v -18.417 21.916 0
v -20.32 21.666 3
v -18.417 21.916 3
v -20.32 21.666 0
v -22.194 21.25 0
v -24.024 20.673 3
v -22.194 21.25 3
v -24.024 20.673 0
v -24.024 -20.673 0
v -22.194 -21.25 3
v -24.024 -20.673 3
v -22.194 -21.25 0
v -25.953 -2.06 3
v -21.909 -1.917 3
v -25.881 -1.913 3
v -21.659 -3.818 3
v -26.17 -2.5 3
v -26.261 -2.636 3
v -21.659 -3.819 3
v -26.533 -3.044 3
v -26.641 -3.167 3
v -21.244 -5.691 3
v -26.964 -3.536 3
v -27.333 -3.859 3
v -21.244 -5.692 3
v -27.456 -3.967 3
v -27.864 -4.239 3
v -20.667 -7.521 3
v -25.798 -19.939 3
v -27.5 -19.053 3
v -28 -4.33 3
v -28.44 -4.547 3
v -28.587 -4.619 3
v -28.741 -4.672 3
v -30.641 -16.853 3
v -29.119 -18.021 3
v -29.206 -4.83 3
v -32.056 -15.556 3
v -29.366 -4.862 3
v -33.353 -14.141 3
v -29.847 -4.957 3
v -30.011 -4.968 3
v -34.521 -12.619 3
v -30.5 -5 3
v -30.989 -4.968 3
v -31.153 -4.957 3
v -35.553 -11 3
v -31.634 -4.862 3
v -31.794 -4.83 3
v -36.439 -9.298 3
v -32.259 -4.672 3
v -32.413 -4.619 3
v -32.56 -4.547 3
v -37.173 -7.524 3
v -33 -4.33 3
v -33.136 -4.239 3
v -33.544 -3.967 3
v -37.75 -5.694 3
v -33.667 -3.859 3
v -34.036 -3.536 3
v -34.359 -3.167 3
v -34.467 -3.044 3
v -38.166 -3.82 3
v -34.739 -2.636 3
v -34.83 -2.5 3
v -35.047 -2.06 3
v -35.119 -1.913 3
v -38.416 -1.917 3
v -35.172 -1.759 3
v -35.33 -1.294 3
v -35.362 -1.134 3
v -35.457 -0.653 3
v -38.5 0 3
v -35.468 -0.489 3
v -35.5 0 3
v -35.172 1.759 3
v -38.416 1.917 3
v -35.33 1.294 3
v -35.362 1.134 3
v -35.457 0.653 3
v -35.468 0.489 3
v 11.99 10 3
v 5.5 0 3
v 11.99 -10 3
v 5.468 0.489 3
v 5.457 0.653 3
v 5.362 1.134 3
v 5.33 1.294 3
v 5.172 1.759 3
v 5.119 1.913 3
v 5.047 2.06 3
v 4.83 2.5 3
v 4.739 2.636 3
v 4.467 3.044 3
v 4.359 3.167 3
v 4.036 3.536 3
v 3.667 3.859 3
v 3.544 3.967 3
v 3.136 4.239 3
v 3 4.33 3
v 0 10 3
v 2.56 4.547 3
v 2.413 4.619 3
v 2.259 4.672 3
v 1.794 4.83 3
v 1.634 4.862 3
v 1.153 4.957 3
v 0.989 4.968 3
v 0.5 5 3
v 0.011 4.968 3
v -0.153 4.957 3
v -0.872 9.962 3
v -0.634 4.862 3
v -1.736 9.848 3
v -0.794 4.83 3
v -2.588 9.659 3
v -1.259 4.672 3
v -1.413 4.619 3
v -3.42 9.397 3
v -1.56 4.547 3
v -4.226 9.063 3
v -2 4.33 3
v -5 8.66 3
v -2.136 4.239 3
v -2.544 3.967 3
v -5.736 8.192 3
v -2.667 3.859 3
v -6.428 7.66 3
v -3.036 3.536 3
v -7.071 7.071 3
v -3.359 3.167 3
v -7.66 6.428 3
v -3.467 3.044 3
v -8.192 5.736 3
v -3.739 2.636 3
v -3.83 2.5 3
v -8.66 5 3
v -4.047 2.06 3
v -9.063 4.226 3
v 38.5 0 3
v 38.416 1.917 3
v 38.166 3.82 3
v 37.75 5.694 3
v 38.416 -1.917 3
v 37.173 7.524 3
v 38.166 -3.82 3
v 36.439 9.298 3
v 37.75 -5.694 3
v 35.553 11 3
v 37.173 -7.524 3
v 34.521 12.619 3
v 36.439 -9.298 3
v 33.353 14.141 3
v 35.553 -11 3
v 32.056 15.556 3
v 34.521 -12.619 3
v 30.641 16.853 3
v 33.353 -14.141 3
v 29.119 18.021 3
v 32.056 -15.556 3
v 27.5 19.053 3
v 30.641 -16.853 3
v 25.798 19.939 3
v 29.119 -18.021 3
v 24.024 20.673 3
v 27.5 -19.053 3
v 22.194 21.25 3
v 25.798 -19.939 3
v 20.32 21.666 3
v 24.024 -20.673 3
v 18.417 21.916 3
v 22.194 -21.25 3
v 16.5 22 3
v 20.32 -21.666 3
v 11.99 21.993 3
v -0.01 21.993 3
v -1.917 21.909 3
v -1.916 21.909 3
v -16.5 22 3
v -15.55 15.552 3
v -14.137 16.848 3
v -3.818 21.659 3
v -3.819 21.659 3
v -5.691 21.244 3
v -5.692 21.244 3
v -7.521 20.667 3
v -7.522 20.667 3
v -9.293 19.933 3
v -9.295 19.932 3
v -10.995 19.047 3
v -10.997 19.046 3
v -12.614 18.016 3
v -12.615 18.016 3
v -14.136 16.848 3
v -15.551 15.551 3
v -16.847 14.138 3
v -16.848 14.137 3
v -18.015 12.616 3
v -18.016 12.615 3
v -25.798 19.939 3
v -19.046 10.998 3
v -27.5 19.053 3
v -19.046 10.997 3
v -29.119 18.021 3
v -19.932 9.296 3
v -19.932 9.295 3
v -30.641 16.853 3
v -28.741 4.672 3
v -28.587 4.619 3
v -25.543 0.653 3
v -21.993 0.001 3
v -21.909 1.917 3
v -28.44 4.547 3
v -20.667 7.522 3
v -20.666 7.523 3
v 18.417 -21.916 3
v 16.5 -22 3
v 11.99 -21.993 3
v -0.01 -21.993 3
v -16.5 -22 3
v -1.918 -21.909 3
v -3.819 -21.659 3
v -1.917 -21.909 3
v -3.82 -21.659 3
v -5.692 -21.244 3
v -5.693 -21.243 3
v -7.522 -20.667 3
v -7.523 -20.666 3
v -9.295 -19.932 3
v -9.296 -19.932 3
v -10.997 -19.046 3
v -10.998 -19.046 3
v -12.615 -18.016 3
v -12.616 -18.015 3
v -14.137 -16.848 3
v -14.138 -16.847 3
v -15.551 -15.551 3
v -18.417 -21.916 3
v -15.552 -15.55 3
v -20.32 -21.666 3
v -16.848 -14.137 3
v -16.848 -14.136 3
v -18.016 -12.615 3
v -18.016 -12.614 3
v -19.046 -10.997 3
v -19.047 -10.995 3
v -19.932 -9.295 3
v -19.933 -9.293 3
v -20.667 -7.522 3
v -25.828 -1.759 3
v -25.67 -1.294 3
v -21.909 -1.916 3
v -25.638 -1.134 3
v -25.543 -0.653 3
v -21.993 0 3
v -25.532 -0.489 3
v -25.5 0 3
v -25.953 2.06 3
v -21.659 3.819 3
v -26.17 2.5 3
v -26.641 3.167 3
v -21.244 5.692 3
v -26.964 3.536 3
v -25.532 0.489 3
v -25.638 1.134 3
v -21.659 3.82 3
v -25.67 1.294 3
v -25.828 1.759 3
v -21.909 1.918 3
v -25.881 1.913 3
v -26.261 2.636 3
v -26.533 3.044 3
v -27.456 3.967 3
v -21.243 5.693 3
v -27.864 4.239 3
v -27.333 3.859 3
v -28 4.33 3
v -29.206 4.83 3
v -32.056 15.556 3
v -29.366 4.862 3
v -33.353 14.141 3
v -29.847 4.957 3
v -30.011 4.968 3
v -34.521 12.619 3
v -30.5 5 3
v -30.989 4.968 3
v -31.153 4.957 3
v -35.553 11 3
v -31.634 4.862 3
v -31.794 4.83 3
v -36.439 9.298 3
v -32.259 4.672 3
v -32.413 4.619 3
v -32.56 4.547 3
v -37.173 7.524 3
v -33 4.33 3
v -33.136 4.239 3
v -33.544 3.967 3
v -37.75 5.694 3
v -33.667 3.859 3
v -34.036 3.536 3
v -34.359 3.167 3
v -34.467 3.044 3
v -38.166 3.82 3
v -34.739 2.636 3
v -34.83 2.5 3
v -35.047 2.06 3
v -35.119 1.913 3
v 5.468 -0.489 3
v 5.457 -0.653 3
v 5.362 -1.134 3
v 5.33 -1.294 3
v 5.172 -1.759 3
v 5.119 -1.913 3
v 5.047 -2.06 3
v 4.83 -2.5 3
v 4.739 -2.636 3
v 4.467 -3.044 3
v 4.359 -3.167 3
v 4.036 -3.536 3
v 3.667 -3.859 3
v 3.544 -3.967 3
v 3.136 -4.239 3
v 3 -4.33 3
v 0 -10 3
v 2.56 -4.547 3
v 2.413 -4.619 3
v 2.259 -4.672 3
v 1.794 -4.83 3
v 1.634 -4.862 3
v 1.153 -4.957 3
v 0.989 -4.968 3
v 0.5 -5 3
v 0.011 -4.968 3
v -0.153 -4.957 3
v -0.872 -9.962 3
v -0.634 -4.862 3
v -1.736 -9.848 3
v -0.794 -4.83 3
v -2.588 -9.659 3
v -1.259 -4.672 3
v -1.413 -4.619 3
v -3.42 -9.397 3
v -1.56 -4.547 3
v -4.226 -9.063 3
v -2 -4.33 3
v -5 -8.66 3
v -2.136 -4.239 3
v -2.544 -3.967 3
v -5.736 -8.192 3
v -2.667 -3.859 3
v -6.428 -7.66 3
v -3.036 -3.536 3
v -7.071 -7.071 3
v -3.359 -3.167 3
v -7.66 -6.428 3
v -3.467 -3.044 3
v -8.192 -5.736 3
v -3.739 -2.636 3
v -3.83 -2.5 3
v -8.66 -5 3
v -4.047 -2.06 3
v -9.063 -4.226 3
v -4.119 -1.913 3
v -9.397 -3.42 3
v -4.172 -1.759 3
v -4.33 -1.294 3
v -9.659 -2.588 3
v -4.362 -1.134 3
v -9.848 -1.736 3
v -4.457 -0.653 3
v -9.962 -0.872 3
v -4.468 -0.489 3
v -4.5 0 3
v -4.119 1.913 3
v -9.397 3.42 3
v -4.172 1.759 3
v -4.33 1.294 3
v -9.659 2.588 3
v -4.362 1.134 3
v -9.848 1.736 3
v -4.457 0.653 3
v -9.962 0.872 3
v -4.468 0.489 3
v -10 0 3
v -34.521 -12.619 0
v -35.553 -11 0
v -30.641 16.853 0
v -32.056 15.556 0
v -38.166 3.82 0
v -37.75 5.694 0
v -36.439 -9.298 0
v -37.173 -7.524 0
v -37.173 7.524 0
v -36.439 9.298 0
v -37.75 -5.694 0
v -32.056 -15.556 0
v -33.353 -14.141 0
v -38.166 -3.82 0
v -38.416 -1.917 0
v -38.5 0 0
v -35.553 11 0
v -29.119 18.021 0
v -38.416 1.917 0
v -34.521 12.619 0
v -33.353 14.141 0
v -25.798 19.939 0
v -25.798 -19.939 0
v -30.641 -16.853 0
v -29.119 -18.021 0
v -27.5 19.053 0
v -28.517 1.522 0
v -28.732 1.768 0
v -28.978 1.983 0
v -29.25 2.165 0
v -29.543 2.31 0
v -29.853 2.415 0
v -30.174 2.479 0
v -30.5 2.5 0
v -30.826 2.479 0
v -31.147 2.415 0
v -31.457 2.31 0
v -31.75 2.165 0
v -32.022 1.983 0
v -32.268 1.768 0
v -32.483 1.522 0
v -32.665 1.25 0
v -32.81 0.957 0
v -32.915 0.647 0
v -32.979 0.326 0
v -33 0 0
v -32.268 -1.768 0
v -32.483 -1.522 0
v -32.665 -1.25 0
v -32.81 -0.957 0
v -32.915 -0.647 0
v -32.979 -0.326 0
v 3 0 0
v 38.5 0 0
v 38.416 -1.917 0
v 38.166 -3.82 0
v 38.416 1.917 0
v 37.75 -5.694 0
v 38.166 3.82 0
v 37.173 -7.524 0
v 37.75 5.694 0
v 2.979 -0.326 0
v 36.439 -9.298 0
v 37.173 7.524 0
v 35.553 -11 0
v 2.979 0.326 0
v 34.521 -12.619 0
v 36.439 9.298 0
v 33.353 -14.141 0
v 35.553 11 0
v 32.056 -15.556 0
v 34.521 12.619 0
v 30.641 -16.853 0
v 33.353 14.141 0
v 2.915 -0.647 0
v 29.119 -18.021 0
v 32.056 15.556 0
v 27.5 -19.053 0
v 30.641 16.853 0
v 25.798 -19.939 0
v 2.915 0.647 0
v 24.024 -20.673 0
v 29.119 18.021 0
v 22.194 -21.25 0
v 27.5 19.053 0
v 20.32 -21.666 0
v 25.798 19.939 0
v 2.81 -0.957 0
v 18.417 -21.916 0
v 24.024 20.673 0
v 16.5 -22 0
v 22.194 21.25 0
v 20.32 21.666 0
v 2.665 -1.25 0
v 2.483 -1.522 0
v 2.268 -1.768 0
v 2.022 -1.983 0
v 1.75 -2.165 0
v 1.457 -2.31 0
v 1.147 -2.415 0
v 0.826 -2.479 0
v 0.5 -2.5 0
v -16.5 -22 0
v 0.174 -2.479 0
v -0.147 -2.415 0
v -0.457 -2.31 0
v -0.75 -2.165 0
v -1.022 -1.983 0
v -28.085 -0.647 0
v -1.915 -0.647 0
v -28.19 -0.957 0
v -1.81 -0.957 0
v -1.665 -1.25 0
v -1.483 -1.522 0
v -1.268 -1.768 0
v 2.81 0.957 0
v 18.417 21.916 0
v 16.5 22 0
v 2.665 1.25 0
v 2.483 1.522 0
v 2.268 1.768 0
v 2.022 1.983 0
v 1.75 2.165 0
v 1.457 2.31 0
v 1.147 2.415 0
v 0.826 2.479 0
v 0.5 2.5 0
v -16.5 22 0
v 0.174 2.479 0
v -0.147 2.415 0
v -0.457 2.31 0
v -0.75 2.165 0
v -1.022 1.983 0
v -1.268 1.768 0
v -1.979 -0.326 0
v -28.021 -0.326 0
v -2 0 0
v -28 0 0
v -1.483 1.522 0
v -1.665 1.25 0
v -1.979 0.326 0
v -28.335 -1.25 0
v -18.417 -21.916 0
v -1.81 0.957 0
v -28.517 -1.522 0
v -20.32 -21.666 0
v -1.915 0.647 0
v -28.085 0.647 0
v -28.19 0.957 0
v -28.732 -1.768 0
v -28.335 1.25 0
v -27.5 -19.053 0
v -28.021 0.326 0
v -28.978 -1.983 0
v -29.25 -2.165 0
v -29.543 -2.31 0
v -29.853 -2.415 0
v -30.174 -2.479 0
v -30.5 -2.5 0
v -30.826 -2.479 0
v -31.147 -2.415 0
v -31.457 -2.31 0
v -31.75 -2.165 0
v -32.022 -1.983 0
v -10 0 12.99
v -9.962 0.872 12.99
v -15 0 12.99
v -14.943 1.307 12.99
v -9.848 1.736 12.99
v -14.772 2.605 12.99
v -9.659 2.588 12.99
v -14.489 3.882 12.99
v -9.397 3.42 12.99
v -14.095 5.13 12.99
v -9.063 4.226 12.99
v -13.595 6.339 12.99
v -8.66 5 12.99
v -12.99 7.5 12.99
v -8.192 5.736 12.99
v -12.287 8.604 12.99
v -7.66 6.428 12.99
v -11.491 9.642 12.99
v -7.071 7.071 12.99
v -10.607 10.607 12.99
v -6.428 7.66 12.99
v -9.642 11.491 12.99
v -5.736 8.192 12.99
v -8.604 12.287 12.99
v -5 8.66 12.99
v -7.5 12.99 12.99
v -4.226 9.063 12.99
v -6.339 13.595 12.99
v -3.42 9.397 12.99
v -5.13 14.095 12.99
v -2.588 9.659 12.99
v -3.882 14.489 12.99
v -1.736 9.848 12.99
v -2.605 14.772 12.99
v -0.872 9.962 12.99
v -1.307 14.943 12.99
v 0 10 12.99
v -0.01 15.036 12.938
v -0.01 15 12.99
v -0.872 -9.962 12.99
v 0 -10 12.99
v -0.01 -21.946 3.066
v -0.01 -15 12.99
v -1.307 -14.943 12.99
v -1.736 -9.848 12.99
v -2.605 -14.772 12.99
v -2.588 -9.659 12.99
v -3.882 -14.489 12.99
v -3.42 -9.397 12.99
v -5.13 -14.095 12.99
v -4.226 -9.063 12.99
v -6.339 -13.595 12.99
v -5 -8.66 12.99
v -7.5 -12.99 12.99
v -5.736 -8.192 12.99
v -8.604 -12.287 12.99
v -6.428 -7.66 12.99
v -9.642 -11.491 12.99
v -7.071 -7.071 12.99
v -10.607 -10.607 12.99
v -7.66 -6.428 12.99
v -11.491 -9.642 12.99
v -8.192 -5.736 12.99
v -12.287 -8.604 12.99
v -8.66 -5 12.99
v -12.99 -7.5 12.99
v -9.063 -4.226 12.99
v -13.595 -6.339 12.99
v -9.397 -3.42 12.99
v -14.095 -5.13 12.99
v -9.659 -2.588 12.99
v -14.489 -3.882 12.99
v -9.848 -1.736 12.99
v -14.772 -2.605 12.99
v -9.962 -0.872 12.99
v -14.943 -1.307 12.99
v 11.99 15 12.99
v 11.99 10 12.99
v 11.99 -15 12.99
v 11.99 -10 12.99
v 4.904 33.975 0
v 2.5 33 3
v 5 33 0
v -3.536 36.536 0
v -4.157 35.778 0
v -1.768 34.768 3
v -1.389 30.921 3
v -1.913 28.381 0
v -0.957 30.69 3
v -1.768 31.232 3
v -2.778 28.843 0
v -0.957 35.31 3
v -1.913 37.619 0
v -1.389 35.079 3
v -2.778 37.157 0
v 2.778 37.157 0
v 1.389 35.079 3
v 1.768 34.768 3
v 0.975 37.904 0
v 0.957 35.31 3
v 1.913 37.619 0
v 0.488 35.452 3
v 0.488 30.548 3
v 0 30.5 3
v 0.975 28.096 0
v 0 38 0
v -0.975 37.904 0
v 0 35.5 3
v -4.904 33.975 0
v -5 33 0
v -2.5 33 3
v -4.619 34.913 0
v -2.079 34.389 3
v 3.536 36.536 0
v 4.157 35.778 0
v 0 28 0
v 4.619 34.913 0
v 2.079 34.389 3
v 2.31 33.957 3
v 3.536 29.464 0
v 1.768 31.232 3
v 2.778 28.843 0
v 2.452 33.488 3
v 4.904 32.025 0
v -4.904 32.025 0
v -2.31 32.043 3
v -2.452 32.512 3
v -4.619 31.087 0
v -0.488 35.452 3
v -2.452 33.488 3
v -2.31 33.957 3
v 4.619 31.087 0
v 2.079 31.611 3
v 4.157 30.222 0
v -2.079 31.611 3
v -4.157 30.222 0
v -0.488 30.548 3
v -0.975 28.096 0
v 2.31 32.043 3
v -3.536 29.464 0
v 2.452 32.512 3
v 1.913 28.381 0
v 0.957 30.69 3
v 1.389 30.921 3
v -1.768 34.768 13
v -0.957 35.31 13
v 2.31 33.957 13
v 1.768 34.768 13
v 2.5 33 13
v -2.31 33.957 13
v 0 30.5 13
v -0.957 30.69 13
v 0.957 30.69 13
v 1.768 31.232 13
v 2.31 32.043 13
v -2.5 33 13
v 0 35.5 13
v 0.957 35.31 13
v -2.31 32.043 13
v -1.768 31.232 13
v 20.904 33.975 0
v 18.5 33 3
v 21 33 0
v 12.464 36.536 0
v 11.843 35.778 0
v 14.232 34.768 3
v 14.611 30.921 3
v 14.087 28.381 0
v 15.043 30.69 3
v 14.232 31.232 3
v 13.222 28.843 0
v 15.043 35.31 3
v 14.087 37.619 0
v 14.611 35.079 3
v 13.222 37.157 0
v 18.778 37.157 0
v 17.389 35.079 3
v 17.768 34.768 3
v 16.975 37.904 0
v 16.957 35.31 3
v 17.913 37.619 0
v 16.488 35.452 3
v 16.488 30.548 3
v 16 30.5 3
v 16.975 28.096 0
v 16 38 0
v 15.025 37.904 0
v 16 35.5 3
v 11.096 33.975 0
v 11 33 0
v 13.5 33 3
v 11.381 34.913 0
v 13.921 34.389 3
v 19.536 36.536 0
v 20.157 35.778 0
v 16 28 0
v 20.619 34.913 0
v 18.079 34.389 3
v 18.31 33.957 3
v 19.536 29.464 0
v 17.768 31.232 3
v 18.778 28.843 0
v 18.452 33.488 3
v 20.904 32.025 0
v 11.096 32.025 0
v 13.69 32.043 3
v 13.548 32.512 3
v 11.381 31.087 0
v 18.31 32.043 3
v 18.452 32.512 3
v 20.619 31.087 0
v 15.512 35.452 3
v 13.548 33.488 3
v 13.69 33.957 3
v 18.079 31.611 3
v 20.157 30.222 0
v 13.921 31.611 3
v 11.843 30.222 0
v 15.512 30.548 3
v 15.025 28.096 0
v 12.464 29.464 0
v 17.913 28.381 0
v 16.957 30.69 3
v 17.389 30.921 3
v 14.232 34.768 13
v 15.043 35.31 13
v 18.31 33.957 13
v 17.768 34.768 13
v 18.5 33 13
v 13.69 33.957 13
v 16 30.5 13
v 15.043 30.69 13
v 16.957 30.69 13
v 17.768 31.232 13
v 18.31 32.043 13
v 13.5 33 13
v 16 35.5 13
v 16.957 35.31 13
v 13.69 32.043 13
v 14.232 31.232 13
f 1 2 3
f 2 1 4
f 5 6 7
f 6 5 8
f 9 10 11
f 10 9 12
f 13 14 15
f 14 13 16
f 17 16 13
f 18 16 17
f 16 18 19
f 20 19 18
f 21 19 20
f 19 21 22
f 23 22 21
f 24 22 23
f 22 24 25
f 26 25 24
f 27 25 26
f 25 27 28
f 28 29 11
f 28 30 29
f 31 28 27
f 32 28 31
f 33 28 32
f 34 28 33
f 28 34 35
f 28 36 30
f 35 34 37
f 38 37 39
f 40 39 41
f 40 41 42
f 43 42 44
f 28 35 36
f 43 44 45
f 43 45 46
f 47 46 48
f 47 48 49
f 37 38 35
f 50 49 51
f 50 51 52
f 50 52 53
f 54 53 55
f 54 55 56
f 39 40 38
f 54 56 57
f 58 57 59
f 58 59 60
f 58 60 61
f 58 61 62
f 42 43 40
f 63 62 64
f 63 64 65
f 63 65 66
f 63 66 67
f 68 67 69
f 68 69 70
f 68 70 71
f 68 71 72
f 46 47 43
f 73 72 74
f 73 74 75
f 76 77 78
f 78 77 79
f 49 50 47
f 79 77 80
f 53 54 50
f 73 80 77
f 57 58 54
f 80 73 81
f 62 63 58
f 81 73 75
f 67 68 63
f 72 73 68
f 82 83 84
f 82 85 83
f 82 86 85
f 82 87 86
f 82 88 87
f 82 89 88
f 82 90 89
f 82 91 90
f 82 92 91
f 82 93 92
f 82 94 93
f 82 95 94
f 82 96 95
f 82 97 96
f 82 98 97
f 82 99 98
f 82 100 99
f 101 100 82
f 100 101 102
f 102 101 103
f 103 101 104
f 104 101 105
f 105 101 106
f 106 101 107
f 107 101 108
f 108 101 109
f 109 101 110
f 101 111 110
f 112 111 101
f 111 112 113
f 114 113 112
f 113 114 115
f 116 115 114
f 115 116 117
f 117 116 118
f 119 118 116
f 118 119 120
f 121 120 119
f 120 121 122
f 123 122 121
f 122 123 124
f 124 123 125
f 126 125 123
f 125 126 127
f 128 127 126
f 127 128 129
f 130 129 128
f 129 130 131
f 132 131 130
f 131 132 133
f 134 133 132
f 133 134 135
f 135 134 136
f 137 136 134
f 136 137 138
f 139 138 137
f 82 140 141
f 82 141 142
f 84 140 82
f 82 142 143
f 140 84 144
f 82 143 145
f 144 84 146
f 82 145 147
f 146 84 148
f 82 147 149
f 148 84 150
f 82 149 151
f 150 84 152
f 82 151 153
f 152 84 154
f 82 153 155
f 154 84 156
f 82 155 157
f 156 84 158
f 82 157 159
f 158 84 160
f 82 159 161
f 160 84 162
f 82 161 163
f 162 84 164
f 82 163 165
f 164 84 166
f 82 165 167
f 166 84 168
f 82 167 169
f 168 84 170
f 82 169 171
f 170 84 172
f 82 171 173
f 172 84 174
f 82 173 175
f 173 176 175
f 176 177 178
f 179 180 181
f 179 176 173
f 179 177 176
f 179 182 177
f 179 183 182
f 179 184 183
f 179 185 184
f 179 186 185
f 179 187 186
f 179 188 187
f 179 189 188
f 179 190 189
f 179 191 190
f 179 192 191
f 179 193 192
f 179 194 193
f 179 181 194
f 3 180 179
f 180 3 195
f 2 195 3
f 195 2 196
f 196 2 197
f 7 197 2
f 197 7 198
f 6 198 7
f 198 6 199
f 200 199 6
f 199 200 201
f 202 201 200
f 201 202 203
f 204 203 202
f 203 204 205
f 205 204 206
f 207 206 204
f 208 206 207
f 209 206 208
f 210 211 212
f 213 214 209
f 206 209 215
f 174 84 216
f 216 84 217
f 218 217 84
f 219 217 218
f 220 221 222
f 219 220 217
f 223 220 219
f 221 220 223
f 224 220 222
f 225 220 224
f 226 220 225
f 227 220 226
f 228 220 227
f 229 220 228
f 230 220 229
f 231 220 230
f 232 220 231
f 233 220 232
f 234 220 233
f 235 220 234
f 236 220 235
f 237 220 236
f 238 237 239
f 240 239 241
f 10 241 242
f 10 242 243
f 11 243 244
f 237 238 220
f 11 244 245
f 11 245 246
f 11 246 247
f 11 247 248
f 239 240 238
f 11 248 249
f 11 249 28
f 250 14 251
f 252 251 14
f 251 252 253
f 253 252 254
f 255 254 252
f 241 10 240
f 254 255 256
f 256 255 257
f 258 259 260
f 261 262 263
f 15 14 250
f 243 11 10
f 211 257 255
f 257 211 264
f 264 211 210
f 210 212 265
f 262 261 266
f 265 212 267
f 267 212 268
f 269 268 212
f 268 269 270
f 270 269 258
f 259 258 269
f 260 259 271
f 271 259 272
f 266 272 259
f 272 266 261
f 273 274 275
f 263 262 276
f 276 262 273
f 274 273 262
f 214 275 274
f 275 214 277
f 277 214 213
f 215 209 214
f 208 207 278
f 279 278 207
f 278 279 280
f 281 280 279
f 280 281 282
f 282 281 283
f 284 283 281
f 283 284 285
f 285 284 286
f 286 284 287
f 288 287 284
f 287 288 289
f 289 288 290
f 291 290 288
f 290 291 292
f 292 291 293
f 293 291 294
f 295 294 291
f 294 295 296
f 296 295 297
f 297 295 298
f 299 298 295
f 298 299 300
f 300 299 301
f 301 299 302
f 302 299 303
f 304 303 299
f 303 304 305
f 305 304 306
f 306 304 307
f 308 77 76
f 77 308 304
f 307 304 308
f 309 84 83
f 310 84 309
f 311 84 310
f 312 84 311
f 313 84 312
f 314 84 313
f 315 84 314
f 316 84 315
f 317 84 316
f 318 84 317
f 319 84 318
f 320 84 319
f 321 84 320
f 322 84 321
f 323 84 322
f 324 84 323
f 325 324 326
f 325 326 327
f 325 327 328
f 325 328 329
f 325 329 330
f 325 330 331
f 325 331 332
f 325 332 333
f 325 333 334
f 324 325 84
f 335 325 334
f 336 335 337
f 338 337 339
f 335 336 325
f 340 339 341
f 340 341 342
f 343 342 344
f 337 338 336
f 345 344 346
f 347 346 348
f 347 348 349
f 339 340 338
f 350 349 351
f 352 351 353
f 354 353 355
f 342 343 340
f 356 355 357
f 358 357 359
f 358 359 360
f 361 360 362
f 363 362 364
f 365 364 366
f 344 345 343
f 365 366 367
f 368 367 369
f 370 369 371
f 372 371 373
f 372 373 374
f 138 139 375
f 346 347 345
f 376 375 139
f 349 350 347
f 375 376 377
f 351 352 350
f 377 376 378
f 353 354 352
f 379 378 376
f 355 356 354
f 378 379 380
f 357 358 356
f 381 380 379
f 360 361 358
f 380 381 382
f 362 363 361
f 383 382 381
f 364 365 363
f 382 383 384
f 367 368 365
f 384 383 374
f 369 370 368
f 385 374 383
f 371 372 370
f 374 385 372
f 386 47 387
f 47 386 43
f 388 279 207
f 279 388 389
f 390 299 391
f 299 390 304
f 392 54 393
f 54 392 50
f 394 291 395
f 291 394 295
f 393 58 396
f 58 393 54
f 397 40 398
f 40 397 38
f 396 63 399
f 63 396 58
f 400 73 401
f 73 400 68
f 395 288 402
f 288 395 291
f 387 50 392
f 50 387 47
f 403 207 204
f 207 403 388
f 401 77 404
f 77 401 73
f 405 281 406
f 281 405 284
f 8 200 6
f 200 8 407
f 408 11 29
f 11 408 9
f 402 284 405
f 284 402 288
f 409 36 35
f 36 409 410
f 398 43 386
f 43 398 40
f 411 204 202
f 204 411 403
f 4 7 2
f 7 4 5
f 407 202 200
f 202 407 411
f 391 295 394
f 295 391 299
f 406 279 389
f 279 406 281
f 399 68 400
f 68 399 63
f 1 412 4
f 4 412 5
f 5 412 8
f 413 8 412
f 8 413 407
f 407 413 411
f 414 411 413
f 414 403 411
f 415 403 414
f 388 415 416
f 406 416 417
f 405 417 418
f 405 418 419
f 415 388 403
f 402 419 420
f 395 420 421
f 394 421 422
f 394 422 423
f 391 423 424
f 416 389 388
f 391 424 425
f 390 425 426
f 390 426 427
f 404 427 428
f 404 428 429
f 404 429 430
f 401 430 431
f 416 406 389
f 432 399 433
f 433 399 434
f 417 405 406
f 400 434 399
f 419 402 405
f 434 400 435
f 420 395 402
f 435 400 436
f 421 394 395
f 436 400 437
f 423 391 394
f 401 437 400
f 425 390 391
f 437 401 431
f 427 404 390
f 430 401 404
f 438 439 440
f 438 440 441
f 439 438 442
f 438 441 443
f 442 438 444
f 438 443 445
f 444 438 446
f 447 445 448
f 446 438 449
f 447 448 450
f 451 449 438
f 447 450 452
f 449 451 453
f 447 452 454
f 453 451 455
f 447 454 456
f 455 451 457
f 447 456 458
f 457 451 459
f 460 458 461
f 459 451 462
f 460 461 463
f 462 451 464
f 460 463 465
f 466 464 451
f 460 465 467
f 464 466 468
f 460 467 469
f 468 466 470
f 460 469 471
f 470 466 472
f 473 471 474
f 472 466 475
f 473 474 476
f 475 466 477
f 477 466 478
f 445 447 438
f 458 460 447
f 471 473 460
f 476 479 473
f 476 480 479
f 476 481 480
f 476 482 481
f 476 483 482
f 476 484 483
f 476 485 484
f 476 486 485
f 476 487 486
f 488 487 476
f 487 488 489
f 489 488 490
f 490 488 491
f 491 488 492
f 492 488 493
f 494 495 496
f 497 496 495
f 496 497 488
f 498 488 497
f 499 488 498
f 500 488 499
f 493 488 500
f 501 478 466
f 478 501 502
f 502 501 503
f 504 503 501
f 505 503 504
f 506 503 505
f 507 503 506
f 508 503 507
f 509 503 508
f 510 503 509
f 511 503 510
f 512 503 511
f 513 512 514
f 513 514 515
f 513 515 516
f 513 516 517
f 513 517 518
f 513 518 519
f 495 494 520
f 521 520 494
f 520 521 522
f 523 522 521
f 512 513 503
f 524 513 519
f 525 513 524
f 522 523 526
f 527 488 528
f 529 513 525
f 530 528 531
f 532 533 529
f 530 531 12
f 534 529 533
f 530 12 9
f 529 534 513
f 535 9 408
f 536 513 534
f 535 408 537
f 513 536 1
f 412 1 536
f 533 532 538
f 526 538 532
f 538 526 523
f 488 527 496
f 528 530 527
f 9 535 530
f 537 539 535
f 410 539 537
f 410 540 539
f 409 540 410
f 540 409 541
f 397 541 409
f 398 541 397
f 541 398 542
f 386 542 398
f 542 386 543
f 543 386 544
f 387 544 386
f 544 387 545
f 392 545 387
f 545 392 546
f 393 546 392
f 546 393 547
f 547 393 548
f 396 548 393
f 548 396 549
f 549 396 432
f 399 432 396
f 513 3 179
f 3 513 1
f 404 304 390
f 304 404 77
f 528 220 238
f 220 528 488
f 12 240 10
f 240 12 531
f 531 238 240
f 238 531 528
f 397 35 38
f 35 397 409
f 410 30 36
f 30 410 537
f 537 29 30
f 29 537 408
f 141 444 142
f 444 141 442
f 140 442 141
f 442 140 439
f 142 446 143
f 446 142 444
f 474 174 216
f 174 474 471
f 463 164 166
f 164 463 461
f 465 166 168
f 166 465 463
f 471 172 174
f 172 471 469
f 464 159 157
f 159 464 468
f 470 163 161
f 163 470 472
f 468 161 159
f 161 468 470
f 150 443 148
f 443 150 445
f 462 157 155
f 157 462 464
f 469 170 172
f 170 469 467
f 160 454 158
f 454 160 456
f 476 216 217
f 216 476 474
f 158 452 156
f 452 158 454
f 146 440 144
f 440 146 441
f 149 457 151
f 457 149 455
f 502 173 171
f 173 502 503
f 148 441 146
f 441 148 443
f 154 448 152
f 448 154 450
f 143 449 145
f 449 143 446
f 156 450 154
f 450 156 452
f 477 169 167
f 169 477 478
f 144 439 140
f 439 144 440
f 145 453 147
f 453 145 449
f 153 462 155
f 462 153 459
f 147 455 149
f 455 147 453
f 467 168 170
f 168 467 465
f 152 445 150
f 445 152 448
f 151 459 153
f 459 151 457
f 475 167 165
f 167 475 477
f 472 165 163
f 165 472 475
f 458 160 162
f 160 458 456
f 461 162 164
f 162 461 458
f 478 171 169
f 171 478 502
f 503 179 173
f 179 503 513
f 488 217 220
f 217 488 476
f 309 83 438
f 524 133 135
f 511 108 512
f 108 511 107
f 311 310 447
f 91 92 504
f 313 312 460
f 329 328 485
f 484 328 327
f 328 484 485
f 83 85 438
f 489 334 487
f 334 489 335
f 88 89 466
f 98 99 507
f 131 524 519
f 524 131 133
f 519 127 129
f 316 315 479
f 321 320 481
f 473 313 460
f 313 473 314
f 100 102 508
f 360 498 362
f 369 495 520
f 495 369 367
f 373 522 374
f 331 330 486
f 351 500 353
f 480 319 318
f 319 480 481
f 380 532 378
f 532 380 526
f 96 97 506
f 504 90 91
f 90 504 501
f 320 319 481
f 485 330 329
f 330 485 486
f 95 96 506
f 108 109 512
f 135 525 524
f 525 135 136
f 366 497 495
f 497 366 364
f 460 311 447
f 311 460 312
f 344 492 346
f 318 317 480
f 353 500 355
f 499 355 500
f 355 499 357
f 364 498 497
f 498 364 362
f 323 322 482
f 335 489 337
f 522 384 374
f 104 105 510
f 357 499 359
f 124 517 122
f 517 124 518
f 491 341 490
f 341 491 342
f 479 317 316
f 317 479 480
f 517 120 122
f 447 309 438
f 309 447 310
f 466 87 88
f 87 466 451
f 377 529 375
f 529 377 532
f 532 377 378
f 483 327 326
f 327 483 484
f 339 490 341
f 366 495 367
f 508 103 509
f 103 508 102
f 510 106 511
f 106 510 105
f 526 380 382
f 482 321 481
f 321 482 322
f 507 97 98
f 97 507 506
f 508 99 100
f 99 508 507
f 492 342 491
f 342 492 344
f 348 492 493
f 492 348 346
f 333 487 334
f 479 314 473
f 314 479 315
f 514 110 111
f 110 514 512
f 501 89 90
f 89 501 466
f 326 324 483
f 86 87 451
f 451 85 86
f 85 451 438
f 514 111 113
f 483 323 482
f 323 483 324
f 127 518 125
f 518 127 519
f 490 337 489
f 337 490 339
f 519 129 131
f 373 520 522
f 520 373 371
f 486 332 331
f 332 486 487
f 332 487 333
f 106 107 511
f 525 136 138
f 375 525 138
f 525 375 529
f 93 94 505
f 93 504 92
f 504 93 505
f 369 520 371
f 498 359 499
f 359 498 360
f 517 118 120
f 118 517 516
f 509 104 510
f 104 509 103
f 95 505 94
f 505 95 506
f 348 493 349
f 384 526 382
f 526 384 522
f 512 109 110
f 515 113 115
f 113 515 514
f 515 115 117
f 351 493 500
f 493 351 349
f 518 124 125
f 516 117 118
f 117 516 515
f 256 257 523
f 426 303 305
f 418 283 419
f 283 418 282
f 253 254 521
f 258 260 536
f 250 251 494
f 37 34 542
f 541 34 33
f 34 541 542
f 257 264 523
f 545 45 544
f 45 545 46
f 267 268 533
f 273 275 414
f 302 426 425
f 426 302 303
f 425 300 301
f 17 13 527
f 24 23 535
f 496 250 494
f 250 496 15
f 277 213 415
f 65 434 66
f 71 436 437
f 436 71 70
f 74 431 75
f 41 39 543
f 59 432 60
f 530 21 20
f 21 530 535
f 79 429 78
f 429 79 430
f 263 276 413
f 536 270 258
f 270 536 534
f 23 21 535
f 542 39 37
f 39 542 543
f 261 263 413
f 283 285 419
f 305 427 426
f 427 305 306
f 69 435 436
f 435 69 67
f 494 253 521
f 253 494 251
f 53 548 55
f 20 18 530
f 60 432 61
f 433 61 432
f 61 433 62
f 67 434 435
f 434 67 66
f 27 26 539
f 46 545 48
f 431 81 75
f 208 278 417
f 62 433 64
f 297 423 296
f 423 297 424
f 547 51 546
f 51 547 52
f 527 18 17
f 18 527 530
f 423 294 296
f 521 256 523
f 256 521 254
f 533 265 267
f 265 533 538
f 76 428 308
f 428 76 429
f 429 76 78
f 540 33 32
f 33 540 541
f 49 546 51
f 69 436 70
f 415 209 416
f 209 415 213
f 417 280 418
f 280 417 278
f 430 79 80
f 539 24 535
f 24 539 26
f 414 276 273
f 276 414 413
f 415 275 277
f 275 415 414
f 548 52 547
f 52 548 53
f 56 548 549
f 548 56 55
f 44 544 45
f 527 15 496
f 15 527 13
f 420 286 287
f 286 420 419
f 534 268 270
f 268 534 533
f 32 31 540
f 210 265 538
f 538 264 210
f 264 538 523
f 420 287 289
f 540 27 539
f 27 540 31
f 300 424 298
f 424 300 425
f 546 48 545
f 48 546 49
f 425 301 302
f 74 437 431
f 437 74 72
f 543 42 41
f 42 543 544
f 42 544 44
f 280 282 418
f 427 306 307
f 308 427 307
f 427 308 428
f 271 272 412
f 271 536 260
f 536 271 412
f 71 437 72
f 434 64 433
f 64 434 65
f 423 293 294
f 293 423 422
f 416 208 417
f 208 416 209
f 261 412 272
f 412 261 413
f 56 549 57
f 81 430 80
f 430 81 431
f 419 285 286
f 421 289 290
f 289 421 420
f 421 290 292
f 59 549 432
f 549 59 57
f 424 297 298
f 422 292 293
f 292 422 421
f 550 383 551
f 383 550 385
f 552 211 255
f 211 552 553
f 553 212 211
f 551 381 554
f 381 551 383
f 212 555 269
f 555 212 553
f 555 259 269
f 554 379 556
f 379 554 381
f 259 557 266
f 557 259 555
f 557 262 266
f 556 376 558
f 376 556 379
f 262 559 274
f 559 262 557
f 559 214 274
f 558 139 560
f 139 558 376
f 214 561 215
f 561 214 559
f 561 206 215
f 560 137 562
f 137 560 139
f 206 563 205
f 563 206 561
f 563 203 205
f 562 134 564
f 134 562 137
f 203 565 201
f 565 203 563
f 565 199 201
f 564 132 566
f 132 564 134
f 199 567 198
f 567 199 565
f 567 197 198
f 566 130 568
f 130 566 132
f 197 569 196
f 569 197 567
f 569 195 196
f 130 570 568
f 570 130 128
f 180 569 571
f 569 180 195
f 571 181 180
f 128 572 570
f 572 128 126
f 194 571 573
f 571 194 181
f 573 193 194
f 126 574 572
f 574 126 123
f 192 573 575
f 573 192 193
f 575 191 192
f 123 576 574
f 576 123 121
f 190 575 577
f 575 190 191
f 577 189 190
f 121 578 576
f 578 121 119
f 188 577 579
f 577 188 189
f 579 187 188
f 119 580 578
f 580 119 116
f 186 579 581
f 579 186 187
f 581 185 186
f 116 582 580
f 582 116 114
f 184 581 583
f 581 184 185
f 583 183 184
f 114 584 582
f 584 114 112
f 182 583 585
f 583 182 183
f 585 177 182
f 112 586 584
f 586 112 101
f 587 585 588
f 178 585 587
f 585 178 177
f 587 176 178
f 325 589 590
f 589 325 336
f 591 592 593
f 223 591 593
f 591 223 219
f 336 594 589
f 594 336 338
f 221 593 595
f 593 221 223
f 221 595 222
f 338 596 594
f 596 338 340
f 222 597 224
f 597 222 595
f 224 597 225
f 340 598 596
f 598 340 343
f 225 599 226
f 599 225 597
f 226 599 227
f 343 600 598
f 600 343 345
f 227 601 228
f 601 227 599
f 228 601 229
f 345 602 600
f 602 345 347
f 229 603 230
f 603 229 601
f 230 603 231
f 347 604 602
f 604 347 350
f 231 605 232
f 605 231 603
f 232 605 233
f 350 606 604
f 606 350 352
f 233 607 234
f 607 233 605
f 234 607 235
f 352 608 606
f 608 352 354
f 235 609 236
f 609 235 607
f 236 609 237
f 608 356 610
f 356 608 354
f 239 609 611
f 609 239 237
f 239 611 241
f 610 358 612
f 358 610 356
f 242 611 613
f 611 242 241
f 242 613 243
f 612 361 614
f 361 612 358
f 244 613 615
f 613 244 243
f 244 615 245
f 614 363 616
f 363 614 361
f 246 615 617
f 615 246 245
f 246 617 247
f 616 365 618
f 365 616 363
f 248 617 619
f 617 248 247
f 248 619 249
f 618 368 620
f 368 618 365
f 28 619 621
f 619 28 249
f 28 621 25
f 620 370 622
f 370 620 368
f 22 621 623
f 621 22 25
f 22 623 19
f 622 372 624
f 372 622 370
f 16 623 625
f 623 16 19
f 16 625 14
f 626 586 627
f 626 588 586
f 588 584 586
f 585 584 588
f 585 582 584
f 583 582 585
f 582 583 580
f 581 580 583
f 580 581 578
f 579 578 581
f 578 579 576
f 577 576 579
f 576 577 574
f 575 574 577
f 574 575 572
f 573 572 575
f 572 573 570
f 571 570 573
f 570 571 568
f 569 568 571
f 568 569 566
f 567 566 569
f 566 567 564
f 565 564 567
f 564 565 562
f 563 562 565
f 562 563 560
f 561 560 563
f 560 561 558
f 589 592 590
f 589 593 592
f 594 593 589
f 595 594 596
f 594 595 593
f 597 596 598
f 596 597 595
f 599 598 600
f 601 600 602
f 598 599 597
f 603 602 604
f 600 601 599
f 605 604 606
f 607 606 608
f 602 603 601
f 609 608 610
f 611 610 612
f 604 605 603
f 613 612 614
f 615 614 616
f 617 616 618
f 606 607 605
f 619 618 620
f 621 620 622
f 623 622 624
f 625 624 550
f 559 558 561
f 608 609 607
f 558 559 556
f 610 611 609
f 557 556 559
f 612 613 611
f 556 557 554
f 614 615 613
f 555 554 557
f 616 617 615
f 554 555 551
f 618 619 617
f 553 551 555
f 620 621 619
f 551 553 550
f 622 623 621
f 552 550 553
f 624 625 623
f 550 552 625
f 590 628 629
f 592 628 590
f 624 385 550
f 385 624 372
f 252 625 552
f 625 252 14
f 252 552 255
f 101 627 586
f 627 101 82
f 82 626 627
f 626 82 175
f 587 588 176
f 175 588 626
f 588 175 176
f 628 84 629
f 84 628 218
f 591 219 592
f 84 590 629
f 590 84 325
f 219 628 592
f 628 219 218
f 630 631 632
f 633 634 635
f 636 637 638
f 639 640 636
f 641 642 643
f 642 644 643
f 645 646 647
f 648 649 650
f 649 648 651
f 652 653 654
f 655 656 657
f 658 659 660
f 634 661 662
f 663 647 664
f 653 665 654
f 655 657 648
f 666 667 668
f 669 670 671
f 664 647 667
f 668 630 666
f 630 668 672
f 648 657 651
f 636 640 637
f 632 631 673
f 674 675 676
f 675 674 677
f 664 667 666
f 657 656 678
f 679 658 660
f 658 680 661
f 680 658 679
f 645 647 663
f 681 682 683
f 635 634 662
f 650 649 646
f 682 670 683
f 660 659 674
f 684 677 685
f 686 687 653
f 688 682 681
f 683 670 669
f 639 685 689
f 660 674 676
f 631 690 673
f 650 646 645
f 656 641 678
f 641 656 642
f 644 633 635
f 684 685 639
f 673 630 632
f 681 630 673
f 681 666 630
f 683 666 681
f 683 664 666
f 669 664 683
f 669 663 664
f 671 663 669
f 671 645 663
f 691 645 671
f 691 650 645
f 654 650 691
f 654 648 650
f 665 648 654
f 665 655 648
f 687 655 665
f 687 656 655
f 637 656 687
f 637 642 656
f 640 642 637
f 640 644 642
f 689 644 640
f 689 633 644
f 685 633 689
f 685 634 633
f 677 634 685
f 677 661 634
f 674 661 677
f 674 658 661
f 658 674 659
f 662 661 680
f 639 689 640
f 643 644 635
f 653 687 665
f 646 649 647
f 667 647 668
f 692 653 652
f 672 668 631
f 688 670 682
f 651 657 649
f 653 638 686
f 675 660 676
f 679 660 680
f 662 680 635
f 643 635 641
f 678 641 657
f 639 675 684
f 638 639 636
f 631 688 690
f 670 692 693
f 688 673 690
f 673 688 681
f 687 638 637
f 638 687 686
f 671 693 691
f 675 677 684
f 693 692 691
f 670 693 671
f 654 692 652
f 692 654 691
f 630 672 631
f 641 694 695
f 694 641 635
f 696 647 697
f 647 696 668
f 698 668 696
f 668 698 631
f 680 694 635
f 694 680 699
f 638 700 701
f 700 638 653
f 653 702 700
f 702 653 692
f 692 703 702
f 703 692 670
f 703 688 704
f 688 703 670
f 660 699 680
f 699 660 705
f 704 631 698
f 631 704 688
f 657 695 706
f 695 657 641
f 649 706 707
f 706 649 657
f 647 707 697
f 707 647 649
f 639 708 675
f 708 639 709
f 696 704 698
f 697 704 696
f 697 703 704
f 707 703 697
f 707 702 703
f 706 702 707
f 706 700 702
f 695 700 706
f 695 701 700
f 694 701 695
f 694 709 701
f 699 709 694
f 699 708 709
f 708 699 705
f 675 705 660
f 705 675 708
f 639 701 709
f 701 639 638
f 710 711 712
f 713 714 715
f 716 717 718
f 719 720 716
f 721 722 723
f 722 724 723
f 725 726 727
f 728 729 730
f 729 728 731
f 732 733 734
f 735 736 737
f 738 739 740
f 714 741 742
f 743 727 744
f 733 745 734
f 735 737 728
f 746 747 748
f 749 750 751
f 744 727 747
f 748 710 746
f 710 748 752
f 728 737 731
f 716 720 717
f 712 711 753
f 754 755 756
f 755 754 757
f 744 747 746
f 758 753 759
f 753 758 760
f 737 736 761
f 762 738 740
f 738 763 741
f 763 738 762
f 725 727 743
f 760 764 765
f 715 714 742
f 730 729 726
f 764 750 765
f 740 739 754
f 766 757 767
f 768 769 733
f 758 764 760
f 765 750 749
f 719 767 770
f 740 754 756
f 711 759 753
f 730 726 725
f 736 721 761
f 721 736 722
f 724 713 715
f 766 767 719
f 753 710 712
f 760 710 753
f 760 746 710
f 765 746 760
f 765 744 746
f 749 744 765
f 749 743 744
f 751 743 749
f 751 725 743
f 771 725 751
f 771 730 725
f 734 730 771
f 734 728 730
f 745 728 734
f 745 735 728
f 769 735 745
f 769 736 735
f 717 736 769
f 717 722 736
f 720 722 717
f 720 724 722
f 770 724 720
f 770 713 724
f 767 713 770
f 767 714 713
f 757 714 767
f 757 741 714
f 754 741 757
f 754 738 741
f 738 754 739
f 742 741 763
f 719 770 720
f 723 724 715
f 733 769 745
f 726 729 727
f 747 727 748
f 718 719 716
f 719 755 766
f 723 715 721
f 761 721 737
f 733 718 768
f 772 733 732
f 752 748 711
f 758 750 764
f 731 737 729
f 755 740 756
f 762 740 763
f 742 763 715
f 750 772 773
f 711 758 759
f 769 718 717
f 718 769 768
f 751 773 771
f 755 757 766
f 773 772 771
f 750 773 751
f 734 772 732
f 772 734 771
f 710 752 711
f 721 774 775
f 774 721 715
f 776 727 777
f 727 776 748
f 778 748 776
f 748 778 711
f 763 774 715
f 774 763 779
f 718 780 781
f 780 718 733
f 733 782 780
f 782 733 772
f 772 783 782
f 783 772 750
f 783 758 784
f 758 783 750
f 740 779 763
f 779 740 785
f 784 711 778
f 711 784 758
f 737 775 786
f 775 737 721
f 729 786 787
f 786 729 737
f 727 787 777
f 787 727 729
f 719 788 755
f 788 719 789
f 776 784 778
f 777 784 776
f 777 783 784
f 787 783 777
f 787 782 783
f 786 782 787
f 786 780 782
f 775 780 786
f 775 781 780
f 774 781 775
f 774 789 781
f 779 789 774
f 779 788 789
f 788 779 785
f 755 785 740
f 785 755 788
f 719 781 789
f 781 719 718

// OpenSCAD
// [FL_INDEX: keywords="openscad, 3d_parametric, Pluggable_Ikea_closet_bar_holder, csg_solid" | COT="Parametric OpenSCAD design from 3DCodeverse"]
// Title: Pluggable Ikea closet bar holder

/* [General] */

// Thickness of bar (add some tolerance)
bar_thickness = 20; // [5:30]
// back thickness of holder around bar
holder_bottom_thickness = 12; // [5:20]
// front thickness of holder around bar
holder_top_thickness = 5; // [0:20]
// thickness of base plate
base_thickness = 3; // [2:5]

/* [Plug] */

plug_depth = 10;
plug_thickness = 5;
// distance inbetween plugs
plug_distance = 26;
// offset location from vertical center
plugs_offset = -15;

/* [Hidden] */

// slight overlap / fudge factor
o = 0.01;
// distance between parts on plate
distance = 6;
bar_radius = bar_thickness/2;
plug_radius = plug_thickness/2;
base_width = bar_thickness+holder_bottom_thickness*2;
base_height = base_width*1.75;
$fa = 5;
$fs = 1;
// from https://github.com/elmom/MCAD/blob/master/boxes.scad
include <MCAD/boxes.scad>

base();
translate([0,0,base_thickness-o]) holder();

translate([0,base_width/2+plug_radius*2+distance,0]) {
  plug();
  translate([plug_radius*4+distance,0,0]) plug();
}

// this is the piece that sticks out to holds the bar
// we will be extruding this
module wall_mold() {
  polygon(points=[[0,0],[0,10],[holder_top_thickness,10],[holder_bottom_thickness,0]]);
}
module holder() {
  difference()
  {
    // this is a circle extrusion of the wall_mold()
    rotate_extrude(convexity = 10) translate([bar_radius, 0, 0]) wall_mold();
    // we only want the bottom 1/2 so lets take take away the top half
    translate([base_width/2,0,15/2-0.1]) cube([base_width,base_width,15],center=true);
  }
  // Here is the "straight" extrusions for the wall_mold()
  translate([-o,bar_radius,0]) rotate([90,0,90])
    linear_extrude( height=bar_radius+2) wall_mold();
  translate([bar_radius+2-o,-bar_radius,0]) rotate([90,0,-90]) 
    linear_extrude(height=bar_radius+2) wall_mold();
}
module base() {
  difference()
  {
     translate([0,0,base_thickness/2]) roundedBox([base_height,base_width, base_thickness], base_width/2, true);
     translate([plugs_offset,0,0]) {
      //
      rotate([180,0,0]) translate([0,0,-base_thickness]) {
        translate([plug_distance/2+plug_radius,0,0]) plug(true);
        translate([-plug_distance/2-plug_radius,0,0]) plug(true);
      }
    }
  }
}
module plug(remove=false) {
  if(remove) {
    translate([0,0,-base_thickness]) cylinder(base_thickness*2,plug_radius*3,plug_radius);
  } else {
    cylinder(base_thickness,plug_radius*2,plug_radius);
  }
  translate([0,0,base_thickness-o])
    cylinder(plug_depth+o,plug_radius,plug_radius);
}
